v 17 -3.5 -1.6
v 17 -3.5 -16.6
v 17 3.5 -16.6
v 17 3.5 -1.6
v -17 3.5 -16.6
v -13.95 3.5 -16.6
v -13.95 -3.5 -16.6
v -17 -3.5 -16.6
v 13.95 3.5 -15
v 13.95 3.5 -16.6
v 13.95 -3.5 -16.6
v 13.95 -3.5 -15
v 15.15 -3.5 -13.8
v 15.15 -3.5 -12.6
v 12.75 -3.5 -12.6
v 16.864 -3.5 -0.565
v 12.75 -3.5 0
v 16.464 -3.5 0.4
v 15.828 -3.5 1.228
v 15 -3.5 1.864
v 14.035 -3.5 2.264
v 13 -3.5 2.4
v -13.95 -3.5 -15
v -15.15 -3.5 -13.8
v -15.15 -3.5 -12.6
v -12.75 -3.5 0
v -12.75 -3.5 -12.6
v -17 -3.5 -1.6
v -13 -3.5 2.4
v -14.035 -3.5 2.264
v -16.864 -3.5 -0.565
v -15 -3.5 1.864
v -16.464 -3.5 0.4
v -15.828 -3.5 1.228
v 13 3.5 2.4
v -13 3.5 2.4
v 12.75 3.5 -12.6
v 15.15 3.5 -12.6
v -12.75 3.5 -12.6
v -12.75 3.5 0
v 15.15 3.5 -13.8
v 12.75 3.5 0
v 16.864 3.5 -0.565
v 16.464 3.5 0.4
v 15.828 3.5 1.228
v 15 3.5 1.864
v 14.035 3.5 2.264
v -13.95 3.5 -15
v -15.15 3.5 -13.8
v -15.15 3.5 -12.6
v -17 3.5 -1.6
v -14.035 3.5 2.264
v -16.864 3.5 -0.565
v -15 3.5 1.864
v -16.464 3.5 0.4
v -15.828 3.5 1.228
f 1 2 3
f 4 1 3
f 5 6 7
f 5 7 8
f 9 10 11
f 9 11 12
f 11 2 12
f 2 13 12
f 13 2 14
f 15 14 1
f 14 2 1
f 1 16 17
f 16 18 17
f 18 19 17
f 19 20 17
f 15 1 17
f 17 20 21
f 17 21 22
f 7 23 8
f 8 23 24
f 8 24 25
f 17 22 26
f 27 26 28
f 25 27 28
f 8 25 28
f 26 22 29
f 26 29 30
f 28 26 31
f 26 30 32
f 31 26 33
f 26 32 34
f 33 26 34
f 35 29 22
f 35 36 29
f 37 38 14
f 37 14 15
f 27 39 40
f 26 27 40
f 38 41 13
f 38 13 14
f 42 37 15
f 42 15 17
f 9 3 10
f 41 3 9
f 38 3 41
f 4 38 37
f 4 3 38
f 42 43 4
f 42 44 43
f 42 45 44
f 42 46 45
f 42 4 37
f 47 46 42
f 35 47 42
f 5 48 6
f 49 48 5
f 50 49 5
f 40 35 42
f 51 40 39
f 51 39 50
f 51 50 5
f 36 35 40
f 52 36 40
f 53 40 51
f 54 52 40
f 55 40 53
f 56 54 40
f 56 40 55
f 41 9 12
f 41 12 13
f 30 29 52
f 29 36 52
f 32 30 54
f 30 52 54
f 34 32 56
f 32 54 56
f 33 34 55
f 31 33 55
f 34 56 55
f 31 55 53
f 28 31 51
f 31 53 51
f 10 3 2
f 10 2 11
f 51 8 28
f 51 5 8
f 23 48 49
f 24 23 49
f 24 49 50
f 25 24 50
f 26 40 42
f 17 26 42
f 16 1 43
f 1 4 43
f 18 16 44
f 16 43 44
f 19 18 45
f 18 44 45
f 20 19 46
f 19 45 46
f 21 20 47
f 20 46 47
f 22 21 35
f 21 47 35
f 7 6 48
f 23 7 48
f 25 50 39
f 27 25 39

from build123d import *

# Parameters (mm, degrees)
F0_W     = 34
F0_H     = 7
F1_DEPTH = 2.4
F2_W     = 4.25
F2_H     = 16.6
F3_DEPTH = 7
F5_DEPTH = 10
F6_R     = 4


# Not quite as in the source:
# - a pattern or mirror of a feature is missing from the dataset's text; its kind, count and spacing are read off the source's solid


with BuildPart() as f1:
    # F0 (on Top) → F1 (new body)
    with BuildSketch(Plane.XY):
        Rectangle(F0_W, F0_H)
    extrude(amount=F1_DEPTH)

    # F2 (on face) → F3 (join)
    with BuildSketch(Plane(origin=(0, 3.5, 0), x_dir=(-1, 0, 0), z_dir=(0, 1, 0))):
        with Locations((14.875, -8.3)):
            Rectangle(F2_W, F2_H)
        with Locations((-14.875, -8.3)):
            Rectangle(F2_W, F2_H)
    extrude(amount=-F3_DEPTH)

    # F4 (on face) → F5 (cut)
    with BuildSketch(Plane(origin=(0, 3.5, 0), x_dir=(-1, 0, 0), z_dir=(0, 1, 0))):
        Polygon((12.75, -12.6), (12.75, -16.6), (13.95, -16.6), (13.95, -15), (15.15, -13.8), (15.15, -12.6), align=None)
    f5 = extrude(amount=-F5_DEPTH, mode=Mode.SUBTRACT)

    # F5_copies: F5 across plane
    add(f5.mirror(Plane(origin=(0, 0, 0), x_dir=(0, 0, 1), z_dir=(1, 0, 0))), mode=Mode.SUBTRACT)

    # F6
    f6_edges = [f1.edges().sort_by_distance(p)[0] for p in [
        (17, 0, 2.4),
        (-17, 0, 2.4),
    ]]
    fillet(f6_edges, radius=F6_R)


solid = f1.part
